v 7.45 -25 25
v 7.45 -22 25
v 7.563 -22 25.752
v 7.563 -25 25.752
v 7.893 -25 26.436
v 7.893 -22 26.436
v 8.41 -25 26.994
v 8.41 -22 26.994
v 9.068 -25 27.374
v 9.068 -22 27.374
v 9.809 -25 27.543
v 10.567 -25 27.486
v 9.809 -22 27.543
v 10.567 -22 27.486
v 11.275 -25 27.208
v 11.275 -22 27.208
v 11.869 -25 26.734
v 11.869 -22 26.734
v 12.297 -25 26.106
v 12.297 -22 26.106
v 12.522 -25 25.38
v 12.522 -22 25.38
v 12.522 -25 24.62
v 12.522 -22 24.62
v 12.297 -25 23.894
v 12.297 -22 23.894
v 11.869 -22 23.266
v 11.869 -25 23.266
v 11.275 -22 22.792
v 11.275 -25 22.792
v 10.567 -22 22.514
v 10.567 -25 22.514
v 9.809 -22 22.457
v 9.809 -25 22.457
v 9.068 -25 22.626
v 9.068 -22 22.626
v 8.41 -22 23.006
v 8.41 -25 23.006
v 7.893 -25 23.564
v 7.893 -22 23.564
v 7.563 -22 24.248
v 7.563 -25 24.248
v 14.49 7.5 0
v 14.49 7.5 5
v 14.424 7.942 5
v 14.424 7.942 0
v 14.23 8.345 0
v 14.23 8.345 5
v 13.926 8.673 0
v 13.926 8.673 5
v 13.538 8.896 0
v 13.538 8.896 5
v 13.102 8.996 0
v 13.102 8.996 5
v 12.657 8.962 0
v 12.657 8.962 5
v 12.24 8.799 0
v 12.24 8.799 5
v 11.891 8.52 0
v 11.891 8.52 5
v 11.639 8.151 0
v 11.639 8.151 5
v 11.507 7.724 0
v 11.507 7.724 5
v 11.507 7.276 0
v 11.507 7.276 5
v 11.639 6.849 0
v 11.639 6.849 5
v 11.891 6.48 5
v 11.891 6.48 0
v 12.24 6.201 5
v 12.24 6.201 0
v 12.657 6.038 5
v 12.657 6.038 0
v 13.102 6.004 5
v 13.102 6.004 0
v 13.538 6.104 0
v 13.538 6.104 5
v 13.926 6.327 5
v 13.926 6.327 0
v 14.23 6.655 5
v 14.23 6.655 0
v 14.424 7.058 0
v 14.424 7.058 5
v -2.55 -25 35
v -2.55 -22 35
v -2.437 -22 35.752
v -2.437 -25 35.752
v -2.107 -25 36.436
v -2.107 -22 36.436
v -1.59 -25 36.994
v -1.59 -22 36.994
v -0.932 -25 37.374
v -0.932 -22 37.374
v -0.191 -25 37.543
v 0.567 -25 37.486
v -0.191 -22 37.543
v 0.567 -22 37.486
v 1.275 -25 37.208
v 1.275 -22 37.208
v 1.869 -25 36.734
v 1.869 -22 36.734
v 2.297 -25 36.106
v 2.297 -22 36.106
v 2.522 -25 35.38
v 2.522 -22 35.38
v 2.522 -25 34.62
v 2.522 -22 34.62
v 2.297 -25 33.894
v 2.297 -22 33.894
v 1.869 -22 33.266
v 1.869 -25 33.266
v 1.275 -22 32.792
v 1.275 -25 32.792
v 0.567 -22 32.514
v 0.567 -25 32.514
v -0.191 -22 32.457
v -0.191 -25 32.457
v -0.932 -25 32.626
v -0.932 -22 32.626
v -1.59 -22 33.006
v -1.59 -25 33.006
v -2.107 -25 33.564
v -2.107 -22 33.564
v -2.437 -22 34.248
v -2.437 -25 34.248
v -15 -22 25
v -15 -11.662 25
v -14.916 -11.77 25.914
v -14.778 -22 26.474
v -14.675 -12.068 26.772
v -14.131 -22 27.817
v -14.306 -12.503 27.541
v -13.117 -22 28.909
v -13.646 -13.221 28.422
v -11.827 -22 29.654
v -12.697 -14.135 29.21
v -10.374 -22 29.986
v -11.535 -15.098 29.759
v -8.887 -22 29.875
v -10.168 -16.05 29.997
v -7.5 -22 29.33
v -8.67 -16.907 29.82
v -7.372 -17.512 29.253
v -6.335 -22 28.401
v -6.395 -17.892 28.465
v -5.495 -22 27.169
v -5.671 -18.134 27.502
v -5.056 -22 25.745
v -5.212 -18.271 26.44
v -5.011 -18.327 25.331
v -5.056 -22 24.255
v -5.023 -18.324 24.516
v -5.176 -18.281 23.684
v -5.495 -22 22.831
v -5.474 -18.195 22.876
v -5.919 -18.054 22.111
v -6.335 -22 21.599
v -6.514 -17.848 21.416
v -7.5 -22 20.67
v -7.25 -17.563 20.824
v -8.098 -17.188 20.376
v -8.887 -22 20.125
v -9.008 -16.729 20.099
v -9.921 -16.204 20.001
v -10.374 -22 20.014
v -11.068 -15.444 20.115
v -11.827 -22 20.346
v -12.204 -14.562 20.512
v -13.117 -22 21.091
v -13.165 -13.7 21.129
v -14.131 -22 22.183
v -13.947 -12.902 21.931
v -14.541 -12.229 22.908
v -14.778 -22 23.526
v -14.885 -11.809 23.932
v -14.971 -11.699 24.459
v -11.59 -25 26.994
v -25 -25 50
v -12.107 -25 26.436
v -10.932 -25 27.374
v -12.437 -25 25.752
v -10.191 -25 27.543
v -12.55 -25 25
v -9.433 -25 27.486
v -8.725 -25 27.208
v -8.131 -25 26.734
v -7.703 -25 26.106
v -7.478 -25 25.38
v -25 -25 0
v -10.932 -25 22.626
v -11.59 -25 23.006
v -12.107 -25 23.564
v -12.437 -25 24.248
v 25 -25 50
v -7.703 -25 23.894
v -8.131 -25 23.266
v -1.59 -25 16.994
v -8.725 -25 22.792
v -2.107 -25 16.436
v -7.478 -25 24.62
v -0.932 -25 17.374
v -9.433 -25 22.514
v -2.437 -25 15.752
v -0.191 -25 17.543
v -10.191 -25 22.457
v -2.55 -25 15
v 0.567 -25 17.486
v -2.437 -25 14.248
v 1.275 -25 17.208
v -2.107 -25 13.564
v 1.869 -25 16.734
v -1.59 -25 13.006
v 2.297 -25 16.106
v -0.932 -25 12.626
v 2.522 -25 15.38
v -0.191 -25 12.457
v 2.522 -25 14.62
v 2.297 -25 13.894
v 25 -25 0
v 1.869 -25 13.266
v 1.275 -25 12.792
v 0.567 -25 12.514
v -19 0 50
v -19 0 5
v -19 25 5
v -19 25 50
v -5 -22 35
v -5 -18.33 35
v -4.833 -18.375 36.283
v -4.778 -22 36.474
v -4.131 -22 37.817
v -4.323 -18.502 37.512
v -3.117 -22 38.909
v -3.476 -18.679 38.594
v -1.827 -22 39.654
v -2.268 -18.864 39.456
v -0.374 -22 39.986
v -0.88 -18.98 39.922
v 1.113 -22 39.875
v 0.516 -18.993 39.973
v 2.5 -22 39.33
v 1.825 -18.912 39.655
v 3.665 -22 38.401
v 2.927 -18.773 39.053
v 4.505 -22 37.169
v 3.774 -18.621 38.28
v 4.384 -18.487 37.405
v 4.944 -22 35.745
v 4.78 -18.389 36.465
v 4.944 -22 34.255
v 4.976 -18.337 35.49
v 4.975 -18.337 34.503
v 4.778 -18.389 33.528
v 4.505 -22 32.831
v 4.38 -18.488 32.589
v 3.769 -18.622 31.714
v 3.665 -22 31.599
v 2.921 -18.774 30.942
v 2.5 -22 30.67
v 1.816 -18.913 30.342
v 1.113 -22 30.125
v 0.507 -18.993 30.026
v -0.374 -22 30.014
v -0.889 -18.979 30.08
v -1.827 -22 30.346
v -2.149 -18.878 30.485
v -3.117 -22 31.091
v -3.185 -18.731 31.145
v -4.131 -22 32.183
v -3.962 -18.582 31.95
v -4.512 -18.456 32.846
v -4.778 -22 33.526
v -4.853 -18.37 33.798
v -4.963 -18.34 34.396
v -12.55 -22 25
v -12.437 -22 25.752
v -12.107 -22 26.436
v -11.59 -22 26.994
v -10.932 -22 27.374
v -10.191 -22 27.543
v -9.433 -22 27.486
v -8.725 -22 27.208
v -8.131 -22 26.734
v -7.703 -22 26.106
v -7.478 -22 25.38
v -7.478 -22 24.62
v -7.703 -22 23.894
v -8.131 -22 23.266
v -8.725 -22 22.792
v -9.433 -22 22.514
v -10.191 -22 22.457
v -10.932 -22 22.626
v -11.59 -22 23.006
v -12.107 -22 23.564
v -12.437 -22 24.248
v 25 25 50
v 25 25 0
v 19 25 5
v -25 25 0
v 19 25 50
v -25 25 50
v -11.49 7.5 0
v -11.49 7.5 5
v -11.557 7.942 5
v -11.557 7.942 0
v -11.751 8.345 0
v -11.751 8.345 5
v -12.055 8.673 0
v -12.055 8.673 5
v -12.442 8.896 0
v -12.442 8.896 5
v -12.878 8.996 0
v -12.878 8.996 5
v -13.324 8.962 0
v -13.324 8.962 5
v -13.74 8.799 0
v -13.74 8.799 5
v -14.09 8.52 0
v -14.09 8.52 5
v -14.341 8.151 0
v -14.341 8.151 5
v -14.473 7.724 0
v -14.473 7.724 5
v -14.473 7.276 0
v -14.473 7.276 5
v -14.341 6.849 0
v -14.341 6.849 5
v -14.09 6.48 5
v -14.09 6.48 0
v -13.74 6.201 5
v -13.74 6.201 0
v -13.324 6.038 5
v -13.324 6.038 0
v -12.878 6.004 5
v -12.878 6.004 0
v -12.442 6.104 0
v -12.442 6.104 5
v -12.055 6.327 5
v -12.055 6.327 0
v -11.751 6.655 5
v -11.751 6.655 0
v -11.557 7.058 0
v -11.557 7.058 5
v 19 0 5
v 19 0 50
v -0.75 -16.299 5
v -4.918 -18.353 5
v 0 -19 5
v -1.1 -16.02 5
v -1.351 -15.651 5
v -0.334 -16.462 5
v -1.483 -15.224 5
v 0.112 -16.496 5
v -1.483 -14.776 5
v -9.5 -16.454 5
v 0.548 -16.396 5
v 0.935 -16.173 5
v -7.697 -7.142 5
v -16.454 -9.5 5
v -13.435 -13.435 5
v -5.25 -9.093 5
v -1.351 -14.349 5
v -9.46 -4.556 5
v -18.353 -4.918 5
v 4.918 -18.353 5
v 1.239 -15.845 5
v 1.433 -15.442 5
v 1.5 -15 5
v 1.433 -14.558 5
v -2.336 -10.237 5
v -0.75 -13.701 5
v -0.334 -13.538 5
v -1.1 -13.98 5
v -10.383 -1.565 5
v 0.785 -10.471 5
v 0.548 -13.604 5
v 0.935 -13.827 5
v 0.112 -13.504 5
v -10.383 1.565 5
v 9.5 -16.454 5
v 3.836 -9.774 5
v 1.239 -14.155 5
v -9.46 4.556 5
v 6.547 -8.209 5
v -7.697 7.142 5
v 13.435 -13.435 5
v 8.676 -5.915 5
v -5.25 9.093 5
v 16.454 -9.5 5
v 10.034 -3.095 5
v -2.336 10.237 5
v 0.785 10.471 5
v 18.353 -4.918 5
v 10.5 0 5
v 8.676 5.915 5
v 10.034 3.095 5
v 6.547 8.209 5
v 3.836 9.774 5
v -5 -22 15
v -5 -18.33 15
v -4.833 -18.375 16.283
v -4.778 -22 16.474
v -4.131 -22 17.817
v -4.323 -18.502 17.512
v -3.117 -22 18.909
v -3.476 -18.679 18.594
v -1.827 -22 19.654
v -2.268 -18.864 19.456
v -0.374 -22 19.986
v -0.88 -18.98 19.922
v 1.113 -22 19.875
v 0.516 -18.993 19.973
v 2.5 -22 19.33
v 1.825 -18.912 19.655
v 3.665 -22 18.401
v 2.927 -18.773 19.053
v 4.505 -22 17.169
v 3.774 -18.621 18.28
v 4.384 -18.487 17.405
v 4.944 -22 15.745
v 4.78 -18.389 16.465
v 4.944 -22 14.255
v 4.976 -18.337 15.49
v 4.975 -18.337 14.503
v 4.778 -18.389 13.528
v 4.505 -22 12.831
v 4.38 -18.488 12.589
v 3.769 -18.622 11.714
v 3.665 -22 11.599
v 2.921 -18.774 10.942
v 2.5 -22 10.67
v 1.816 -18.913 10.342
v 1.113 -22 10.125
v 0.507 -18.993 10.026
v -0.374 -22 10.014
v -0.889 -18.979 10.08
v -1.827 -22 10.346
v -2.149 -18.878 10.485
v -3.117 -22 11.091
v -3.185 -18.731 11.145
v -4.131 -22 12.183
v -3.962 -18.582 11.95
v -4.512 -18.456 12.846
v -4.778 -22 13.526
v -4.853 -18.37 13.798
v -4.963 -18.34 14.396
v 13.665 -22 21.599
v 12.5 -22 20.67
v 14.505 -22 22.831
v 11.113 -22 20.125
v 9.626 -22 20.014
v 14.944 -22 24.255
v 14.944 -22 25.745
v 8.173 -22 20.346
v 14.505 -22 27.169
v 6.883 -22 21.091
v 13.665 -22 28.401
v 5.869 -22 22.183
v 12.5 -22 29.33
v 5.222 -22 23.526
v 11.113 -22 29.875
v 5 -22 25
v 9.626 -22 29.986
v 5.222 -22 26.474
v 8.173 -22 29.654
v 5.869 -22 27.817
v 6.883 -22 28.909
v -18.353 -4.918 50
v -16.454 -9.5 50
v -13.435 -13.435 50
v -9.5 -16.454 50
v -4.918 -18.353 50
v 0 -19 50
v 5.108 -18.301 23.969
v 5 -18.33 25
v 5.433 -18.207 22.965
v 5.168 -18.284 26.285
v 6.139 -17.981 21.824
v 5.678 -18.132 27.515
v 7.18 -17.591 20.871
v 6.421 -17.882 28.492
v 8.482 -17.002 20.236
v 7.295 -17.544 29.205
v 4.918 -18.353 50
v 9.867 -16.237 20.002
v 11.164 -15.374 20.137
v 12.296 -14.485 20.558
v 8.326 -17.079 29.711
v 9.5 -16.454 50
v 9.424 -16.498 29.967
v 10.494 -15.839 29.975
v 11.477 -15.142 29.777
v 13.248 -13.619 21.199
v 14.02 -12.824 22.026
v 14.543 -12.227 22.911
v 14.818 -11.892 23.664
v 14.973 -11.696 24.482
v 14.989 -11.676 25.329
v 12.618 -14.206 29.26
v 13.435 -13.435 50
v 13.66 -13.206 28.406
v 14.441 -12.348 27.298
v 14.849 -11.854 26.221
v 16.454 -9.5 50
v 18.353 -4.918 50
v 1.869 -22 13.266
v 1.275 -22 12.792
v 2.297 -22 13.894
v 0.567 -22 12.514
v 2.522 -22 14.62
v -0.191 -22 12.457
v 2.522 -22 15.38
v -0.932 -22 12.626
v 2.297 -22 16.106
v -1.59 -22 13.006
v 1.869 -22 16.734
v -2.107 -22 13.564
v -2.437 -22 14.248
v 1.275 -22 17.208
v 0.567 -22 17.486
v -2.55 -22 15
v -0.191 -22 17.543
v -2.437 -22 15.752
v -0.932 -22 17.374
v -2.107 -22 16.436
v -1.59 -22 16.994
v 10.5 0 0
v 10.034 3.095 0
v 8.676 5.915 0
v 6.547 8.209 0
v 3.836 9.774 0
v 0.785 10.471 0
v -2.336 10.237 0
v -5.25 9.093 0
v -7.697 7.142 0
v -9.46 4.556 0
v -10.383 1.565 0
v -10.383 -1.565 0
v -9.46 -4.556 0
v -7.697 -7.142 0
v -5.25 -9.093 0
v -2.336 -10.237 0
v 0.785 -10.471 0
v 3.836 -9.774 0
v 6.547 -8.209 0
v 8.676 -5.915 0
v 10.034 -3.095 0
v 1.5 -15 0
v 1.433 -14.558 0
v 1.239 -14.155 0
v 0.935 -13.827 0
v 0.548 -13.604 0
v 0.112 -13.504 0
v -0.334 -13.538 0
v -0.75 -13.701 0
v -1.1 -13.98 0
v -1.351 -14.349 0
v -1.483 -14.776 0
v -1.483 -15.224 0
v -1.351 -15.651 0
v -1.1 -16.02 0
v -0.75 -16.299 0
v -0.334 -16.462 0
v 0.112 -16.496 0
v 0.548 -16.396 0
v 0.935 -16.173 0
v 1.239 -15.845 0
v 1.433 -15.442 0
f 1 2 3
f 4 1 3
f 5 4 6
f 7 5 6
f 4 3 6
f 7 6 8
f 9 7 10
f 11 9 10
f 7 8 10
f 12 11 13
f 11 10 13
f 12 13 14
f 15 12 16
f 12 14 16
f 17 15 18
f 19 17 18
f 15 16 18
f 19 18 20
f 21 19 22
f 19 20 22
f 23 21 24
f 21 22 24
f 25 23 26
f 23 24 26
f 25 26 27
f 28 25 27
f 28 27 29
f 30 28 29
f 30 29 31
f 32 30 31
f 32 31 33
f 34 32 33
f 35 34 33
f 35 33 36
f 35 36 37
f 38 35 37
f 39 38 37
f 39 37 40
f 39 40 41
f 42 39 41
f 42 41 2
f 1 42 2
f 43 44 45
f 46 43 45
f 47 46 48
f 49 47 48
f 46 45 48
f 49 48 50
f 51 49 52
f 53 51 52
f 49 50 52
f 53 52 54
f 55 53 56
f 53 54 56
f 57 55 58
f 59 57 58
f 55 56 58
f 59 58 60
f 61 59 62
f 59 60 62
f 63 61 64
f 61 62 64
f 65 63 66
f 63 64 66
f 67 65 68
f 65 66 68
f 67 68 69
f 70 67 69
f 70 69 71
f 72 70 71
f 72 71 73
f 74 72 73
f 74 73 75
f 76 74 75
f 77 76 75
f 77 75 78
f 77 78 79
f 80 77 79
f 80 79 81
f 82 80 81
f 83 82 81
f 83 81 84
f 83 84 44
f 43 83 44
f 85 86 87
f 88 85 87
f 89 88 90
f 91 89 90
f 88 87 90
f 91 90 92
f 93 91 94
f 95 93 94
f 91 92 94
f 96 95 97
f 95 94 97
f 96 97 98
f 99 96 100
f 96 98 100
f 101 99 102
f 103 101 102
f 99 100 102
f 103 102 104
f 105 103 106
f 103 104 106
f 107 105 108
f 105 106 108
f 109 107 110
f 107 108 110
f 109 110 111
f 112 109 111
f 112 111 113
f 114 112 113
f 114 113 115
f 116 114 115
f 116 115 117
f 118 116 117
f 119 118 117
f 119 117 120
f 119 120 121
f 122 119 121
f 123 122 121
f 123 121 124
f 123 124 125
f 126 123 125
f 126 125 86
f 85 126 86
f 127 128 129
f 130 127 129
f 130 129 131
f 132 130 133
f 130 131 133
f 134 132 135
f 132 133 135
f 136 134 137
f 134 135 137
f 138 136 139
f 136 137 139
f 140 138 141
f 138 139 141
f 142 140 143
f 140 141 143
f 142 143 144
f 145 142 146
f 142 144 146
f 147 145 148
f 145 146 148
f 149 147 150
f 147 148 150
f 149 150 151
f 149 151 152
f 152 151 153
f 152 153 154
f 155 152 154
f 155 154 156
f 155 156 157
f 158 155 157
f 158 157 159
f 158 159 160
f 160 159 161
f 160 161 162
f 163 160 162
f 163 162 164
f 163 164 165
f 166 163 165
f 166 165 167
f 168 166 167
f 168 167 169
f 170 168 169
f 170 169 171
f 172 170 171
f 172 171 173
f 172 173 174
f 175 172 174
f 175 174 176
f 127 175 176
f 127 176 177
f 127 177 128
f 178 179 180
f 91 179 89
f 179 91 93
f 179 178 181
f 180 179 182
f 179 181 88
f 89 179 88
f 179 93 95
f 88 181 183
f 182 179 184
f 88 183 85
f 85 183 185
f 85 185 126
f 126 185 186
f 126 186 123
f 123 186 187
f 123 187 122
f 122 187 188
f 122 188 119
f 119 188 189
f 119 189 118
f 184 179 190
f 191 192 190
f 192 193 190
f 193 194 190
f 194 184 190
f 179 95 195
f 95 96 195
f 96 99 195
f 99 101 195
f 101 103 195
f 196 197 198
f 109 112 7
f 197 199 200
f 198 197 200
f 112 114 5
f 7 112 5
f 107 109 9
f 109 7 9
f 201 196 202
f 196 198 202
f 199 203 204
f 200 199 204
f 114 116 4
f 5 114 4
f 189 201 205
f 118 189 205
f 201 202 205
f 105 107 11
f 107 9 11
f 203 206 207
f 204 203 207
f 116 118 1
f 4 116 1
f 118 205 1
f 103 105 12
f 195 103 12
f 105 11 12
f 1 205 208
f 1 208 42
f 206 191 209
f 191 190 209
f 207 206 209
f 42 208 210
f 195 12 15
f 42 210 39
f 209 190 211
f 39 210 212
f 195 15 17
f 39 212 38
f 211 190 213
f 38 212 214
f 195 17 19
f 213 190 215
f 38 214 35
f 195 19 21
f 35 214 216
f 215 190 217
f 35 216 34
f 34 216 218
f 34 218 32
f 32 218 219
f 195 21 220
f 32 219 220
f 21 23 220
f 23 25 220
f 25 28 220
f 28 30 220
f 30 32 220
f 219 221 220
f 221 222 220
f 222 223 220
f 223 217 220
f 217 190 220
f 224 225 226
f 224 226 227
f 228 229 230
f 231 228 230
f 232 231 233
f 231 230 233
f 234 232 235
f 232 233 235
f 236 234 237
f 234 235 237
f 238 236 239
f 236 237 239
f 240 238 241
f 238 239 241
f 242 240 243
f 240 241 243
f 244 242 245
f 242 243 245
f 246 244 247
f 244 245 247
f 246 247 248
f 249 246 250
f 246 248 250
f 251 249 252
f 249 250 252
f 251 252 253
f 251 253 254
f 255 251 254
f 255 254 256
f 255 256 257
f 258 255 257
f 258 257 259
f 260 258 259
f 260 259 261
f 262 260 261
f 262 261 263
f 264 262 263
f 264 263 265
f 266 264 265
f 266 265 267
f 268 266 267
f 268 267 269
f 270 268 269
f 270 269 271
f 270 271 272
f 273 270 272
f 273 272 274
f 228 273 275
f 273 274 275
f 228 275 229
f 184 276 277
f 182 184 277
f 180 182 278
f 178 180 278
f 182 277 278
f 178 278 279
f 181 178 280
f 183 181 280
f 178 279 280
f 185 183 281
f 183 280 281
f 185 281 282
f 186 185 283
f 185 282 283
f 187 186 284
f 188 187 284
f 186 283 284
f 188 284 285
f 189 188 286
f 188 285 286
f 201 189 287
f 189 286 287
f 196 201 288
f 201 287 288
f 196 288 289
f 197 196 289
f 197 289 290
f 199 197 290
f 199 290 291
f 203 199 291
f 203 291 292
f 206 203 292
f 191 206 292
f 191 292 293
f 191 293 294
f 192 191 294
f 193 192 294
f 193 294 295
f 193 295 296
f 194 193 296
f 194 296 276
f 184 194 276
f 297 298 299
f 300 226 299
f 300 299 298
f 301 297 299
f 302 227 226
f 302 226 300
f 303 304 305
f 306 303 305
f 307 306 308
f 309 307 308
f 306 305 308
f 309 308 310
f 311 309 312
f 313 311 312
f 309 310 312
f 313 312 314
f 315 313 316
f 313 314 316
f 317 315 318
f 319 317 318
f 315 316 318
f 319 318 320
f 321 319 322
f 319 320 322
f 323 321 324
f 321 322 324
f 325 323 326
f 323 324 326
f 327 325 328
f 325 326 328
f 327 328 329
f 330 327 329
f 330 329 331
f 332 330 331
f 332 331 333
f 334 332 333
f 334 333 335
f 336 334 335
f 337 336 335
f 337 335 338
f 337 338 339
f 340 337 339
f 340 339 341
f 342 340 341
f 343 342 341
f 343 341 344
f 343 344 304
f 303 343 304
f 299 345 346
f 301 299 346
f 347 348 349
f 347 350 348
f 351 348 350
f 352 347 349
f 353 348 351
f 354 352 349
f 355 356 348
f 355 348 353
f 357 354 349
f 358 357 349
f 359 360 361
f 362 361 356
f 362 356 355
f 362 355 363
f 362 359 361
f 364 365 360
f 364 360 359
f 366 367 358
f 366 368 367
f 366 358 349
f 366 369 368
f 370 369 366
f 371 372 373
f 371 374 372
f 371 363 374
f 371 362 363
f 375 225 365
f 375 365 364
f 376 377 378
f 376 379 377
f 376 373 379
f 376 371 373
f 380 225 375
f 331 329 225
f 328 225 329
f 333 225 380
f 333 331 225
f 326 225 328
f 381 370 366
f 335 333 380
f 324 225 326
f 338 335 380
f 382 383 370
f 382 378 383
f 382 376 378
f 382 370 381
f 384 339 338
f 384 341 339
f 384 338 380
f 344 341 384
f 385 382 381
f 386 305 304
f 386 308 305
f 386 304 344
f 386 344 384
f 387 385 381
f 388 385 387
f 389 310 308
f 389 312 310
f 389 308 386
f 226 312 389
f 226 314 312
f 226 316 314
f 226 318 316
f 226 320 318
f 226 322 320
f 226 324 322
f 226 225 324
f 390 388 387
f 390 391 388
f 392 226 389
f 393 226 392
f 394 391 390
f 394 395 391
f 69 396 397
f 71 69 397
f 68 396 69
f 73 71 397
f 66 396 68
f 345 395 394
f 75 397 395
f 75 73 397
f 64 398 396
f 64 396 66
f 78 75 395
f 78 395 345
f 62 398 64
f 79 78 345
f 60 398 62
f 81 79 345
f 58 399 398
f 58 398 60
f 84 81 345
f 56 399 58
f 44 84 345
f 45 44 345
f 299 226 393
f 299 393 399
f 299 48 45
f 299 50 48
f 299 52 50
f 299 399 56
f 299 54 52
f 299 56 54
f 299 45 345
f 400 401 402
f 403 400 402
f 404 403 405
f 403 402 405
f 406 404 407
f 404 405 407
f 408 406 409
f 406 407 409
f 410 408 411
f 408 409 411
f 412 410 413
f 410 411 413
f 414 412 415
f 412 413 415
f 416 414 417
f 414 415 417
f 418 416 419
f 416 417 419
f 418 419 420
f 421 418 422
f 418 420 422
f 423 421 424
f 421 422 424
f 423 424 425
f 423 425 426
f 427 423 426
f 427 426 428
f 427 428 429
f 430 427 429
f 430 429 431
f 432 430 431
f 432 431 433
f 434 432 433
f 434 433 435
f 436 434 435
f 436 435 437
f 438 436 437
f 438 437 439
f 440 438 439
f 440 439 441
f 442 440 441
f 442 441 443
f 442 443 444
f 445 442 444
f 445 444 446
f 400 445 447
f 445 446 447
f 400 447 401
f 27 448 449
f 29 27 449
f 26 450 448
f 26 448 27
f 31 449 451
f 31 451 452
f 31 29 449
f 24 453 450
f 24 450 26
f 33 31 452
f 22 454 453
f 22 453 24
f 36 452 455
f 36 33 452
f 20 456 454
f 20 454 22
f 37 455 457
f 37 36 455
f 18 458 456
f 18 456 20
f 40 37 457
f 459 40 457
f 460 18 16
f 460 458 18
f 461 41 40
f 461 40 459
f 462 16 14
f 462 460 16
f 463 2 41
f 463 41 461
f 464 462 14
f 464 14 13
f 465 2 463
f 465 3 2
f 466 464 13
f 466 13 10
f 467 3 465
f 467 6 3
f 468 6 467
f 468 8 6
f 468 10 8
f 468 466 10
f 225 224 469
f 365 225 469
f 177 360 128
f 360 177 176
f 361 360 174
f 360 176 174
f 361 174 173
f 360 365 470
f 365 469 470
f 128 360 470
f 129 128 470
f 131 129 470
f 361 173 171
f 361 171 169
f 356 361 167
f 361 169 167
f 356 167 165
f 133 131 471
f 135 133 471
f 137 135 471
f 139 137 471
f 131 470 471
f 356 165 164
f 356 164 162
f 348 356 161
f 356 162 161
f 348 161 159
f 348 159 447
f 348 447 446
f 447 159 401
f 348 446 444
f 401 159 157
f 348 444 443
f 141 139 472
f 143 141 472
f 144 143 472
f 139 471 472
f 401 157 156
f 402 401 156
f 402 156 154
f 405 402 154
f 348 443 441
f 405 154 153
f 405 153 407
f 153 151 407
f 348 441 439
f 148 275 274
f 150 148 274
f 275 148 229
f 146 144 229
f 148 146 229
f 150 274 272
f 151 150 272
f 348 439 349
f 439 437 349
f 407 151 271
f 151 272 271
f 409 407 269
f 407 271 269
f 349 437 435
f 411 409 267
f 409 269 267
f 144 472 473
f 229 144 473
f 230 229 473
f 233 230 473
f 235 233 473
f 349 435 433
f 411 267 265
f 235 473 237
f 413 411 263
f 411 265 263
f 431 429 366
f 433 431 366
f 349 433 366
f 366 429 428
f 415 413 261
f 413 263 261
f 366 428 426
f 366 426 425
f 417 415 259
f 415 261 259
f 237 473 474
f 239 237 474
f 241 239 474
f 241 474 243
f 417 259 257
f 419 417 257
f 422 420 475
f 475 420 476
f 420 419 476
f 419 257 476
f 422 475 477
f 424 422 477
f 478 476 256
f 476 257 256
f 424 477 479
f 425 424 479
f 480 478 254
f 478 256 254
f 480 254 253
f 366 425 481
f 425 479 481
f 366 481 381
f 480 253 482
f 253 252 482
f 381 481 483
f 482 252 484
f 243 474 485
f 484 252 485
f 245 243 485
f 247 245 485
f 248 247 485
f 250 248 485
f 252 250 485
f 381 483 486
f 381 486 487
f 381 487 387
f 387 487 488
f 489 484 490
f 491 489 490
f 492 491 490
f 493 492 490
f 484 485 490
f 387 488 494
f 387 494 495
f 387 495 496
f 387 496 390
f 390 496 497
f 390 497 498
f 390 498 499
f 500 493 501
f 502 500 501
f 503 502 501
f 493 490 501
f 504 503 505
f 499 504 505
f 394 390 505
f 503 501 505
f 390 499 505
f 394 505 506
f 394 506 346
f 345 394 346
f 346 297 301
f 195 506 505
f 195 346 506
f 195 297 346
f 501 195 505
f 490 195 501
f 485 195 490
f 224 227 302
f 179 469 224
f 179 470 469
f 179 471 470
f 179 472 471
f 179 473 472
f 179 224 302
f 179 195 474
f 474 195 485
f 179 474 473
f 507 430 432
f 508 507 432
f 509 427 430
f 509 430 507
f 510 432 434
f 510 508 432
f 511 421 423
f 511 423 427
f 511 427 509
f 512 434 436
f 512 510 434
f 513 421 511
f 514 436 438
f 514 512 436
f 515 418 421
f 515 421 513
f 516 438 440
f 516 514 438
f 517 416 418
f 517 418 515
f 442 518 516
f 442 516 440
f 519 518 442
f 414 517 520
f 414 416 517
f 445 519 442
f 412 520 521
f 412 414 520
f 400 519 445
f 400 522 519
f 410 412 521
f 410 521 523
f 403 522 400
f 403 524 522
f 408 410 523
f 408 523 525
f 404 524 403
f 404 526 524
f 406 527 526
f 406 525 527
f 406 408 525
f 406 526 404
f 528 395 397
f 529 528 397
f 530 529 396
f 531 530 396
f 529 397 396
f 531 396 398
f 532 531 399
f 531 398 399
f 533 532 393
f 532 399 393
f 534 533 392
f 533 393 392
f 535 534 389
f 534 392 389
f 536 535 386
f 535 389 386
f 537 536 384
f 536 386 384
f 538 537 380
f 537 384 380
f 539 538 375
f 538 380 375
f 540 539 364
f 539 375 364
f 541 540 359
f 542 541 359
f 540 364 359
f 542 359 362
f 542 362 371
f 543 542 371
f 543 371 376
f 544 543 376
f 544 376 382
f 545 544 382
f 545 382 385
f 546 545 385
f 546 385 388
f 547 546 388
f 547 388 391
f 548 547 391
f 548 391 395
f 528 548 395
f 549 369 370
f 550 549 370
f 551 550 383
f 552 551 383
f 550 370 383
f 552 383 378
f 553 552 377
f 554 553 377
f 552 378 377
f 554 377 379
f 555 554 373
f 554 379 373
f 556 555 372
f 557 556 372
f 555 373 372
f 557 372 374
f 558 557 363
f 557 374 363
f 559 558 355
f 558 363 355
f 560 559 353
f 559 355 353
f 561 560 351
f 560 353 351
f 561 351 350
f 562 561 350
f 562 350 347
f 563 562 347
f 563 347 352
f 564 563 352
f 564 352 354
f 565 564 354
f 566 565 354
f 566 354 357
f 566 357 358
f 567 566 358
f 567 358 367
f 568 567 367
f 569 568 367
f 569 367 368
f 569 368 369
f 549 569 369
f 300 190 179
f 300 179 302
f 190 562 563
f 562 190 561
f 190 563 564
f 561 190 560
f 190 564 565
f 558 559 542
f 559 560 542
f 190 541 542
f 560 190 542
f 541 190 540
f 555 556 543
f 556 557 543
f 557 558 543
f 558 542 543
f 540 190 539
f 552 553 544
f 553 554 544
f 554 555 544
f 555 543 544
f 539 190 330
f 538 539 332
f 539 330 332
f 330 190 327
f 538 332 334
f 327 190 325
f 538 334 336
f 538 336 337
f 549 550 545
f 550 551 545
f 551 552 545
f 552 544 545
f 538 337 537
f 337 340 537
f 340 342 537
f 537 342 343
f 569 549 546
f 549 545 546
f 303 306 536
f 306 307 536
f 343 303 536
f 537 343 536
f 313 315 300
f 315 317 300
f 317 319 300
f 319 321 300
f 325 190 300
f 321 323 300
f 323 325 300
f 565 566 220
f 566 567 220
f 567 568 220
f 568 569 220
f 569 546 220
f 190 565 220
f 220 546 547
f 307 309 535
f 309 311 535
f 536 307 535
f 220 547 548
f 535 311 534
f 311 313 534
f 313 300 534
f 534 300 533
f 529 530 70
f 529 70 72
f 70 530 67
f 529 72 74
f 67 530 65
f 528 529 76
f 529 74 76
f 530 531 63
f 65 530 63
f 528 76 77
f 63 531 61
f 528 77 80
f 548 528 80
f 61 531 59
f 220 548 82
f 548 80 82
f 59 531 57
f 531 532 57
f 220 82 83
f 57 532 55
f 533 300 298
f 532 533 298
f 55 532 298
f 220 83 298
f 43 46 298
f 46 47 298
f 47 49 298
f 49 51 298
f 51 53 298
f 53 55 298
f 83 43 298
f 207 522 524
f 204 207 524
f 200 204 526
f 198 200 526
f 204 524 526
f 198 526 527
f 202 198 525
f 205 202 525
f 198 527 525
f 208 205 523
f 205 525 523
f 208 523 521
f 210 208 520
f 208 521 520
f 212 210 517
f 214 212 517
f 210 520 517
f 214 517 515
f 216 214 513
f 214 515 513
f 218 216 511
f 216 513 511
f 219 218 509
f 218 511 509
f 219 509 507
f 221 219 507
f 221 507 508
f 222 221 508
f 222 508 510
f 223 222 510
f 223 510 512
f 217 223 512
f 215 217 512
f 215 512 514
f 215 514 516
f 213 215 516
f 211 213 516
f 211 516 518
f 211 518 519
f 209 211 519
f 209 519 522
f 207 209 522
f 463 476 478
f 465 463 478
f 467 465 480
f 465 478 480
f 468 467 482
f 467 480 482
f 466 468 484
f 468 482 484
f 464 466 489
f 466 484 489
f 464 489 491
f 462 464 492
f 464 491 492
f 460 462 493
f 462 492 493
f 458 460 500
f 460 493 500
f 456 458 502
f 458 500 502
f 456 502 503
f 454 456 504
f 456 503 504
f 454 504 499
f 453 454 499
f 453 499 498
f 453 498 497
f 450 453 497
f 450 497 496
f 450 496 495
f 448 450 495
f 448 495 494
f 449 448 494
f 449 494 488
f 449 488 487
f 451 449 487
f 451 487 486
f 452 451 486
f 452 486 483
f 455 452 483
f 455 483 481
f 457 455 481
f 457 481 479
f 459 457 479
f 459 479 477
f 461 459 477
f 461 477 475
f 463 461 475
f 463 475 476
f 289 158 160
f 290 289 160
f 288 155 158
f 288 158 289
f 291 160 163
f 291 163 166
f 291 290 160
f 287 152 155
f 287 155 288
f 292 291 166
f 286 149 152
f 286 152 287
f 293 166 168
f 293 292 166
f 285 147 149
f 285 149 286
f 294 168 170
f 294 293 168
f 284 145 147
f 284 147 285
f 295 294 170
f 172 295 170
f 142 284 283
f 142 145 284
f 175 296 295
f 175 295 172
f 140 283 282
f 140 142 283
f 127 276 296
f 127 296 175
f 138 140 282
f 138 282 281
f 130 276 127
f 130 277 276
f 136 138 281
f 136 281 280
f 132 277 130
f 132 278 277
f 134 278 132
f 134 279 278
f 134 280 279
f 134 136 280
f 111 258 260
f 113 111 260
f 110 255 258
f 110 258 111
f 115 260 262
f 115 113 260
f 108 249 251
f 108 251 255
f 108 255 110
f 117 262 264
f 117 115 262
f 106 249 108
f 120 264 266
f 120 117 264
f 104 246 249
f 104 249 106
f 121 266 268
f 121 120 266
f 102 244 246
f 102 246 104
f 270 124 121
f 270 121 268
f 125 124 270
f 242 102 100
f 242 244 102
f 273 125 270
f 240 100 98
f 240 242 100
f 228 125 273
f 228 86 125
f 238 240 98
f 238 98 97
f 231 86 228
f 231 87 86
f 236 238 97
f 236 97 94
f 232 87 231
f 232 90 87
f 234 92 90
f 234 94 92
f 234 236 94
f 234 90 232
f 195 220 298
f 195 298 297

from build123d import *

# Parameters (mm, degrees)
SKETCH_W        = 50
SKETCH_H        = 50
PAD_DEPTH       = 50
SKETCH001_R     = 19
POCKET_DEPTH    = 45
SKETCH002_W     = 50
SKETCH002_H     = 25
POCKET001_DEPTH = 45
SKETCH003_R     = 10.5
SKETCH003_R_2   = 1.5
POCKET002_DEPTH = 5.001
SKETCH004_W     = 6
SKETCH004_H     = 45
PAD001_DEPTH    = 25
SKETCH005_R     = 5
POCKET003_DEPTH = 12
SKETCH006_R     = 2.55
POCKET004_DEPTH = 3.001


with BuildPart() as part:
    # Sketch → Pad (new body)
    with BuildSketch(Plane.XY):
        Rectangle(SKETCH_W, SKETCH_H)
    extrude(amount=PAD_DEPTH)

    # Sketch001 (on DatumPlane) → Pocket (cut)
    with BuildSketch(Plane.XY.offset(50)):
        Circle(SKETCH001_R)
    extrude(amount=-POCKET_DEPTH, mode=Mode.SUBTRACT)

    # Sketch002 (on DatumPlane) → Pocket001 (cut)
    with BuildSketch(Plane.XY.offset(50)):
        with Locations((0, 12.5)):
            Rectangle(SKETCH002_W, SKETCH002_H)
    extrude(amount=-POCKET001_DEPTH, mode=Mode.SUBTRACT)

    # Sketch003 (on DatumPlane) → Pocket002 (cut, through all)
    with BuildSketch(Plane.XY.offset(5)):
        Circle(SKETCH003_R)
        with Locations((0, -15)):
            Circle(SKETCH003_R_2)
        with Locations((12.990381, 7.5)):
            Circle(SKETCH003_R_2)
        with Locations((-12.99, 7.5)):
            Circle(SKETCH003_R_2)
    extrude(amount=-POCKET002_DEPTH, mode=Mode.SUBTRACT)

    # Sketch004 (on DatumPlane) → Pad001 (join)
    with BuildSketch(Plane(origin=(0, 0, 0), x_dir=(-1, 0, 0), z_dir=(0, 1, 0))):
        with Locations((-22, 27.5)):
            Rectangle(SKETCH004_W, SKETCH004_H)
        with Locations((22, 27.5)):
            Rectangle(SKETCH004_W, SKETCH004_H)
    extrude(amount=PAD001_DEPTH)

    # Sketch005 (on DatumPlane) → Pocket003 (cut)
    with BuildSketch(Plane(origin=(0, -10, 0), x_dir=(-1, 0, 0), z_dir=(0, 1, 0))):
        with Locations((0, 35)):
            Circle(SKETCH005_R)
        with Locations((0, 15)):
            Circle(SKETCH005_R)
        with Locations((10, 25)):
            Circle(SKETCH005_R)
        with Locations((-10, 25)):
            Circle(SKETCH005_R)
    extrude(amount=-POCKET003_DEPTH, mode=Mode.SUBTRACT)

    # Sketch006 (on DatumPlane) → Pocket004 (cut, through all)
    with BuildSketch(Plane(origin=(0, -22, 0), x_dir=(-1, 0, 0), z_dir=(0, 1, 0))):
        with Locations((0, 15)):
            Circle(SKETCH006_R)
        with Locations((10, 25)):
            Circle(SKETCH006_R)
        with Locations((0, 35)):
            Circle(SKETCH006_R)
        with Locations((-10, 25)):
            Circle(SKETCH006_R)
    extrude(amount=-POCKET004_DEPTH, mode=Mode.SUBTRACT)


solid = part.part
